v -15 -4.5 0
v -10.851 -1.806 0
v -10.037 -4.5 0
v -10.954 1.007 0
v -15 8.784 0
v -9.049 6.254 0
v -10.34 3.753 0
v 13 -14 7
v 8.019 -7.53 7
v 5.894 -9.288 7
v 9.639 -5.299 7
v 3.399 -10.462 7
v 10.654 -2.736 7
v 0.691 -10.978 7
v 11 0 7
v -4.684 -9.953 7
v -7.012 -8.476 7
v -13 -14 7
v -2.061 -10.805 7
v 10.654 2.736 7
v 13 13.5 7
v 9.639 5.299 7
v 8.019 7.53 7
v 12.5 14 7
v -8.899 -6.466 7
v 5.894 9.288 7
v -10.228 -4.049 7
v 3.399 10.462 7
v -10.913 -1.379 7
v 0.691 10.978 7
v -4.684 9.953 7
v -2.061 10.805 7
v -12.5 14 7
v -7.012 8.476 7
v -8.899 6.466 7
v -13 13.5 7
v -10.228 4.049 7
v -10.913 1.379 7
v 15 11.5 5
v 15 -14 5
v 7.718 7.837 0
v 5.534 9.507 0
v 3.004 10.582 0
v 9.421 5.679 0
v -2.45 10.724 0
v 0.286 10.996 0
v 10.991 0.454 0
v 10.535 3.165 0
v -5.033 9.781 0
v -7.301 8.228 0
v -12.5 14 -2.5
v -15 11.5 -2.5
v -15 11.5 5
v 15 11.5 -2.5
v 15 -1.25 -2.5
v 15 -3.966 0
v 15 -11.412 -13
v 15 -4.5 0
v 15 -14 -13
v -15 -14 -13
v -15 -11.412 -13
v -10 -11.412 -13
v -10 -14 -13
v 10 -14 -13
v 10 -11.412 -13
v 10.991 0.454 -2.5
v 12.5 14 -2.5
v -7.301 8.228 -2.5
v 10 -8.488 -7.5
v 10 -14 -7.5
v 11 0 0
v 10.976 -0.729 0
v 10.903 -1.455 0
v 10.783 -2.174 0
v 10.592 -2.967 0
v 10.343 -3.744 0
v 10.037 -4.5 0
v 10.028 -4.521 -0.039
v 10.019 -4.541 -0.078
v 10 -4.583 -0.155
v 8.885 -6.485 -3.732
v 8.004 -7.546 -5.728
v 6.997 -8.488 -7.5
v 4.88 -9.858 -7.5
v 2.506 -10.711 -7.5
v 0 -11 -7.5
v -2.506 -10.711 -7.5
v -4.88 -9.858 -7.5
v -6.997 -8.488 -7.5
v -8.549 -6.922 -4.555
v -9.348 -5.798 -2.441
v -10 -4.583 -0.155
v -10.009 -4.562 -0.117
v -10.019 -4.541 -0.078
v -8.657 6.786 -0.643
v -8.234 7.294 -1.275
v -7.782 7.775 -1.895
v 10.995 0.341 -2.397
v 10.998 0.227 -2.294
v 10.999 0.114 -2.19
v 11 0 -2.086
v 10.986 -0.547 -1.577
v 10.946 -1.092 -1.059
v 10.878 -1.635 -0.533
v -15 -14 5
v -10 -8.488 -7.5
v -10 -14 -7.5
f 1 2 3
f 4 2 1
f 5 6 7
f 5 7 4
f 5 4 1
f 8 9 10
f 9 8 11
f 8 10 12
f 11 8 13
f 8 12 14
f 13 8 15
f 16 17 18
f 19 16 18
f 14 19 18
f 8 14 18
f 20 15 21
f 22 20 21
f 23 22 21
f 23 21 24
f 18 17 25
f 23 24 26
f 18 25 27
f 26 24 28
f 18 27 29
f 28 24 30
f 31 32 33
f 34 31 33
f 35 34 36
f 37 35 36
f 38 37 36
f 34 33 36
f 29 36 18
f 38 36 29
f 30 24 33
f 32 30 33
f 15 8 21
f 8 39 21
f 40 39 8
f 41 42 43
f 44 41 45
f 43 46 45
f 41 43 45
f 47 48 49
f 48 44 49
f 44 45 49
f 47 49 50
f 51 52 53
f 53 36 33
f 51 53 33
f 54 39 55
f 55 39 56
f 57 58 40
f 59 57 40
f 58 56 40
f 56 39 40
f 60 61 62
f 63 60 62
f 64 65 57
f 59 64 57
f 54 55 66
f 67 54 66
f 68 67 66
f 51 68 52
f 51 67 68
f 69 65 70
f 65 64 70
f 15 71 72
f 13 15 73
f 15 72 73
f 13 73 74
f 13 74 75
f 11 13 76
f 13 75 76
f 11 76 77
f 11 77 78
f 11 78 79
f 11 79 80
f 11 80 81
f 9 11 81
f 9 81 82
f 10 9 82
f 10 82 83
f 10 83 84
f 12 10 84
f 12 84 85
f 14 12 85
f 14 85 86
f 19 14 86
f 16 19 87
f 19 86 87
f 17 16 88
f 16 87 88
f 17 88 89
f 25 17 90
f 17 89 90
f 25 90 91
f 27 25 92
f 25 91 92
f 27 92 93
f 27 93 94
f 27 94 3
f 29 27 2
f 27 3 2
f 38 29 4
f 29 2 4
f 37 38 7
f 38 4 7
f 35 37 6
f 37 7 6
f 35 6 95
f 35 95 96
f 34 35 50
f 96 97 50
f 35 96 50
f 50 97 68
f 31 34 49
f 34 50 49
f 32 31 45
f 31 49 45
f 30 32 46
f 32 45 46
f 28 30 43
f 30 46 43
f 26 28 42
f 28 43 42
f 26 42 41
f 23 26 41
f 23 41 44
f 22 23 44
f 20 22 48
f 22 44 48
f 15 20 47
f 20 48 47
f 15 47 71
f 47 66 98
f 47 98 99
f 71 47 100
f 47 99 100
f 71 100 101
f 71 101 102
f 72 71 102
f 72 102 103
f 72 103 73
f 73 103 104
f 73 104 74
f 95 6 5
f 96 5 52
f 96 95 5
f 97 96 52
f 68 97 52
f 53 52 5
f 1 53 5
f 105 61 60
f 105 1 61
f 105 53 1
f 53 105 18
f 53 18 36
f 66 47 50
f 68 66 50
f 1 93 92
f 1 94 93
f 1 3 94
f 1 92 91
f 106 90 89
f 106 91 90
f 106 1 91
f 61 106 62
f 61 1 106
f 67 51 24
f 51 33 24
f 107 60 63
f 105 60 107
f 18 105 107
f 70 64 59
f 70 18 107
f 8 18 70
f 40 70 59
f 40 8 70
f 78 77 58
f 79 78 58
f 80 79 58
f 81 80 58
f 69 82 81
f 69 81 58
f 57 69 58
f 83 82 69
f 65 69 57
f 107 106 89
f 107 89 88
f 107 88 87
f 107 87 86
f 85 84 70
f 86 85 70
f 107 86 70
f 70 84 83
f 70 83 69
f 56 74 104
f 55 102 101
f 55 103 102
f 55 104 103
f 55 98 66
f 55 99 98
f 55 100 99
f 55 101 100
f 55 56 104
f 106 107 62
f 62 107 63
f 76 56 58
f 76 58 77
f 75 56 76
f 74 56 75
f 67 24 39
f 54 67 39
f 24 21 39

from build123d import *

# Parameters (mm, degrees)
SKETCH1_R           = 11
BOSS_EXTRUDE1_DEPTH = 7
SKETCH2_W           = 5
SKETCH2_H           = 2.5
BOSS_EXTRUDE2_DEPTH = 13
CHAMFER2_SIZE       = 2
BOSS_EXTRUDE6_DEPTH = 2.5
CHAMFER3_SIZE       = 2
CHAMFER4_SIZE       = 2
BOSS_EXTRUDE4_DEPTH = 2.5
CHAMFER6_SIZE       = 2.5
CHAMFER7_SIZE       = 7
CHAMFER7_SIZE_2     = 13.165085257


with BuildPart() as part:
    # Sketch1 → Boss-Extrude1 (new body)
    with BuildSketch(Plane.XY):
        Polygon((-15, 11.5), (-12.5, 14), (12.5, 14), (15, 11.5), (15, -14), (-15, -14), align=None)
        Circle(SKETCH1_R, mode=Mode.SUBTRACT)
    extrude(amount=BOSS_EXTRUDE1_DEPTH)

    # Sketch2 → Boss-Extrude2 (add)
    with BuildSketch(Plane(origin=(0, 0, 0), x_dir=(-1, 0, 0), z_dir=(0, 0, -1))):
        with Locations((-12.5, -12.75)):
            Rectangle(SKETCH2_W, SKETCH2_H)
        with Locations((12.5, -12.75)):
            Rectangle(SKETCH2_W, SKETCH2_H)
    extrude(amount=BOSS_EXTRUDE2_DEPTH)

    # Chamfer2
    chamfer2_edges = [part.edges().sort_by_distance(p)[0] for p in [
        (-10, -12.75, 0),
        (10, -12.75, 0),
    ]]
    chamfer(chamfer2_edges, length=CHAMFER2_SIZE)

    # Sketch5 → Boss-Extrude6 (add)
    with BuildSketch(Plane.XZ.offset(14)):
        Polygon((-10, -2), (-10, -7.5), (10, -7.5), (10, -2), (8, 0), (-8, 0), align=None)
    extrude(amount=-BOSS_EXTRUDE6_DEPTH)

    # Chamfer3
    chamfer3_edges = [part.edges().sort_by_distance(p)[0] for p in [
        (15, -1.25, 7),
    ]]
    chamfer(chamfer3_edges, length=CHAMFER3_SIZE)

    # Chamfer4
    chamfer4_edges = [part.edges().sort_by_distance(p)[0] for p in [
        (-15, -1.25, 7),
    ]]
    chamfer(chamfer4_edges, length=CHAMFER4_SIZE)

    # Sketch4 → Boss-Extrude4 (add)
    with BuildSketch(Plane(origin=(0, 0, 0), x_dir=(-1, 0, 0), z_dir=(0, 0, -1))):
        Polygon((-15, -1.25), (15, 11.5), (12.5, 14), (-12.5, 14), (-15, 11.5), align=None)
    extrude(amount=BOSS_EXTRUDE4_DEPTH)

    # Chamfer6
    # the kernel refuses this chamfer: 2.5 mm, written as the material it adds along each edge
    with BuildSketch(Plane(origin=(20.916998416, -3.764724327, 0), x_dir=(-0.39099275668343275, -0.9199829569021947, 0.02749587661058635), z_dir=(-0.9203309184584746, 0.39114064034485174, 0))) as chamfer6_piece_1_section:
        Polygon((CHAMFER6_SIZE * 0.999621916911, -CHAMFER6_SIZE * 0.0274958766106), (-CHAMFER6_SIZE * 0.0274958766106, -CHAMFER6_SIZE * 0.999621916911), (0, 0), align=None)
    chamfer6_piece_1 = extrude(amount=17.214861222, mode=Mode.PRIVATE)
    chamfer6_piece_1 = chamfer6_piece_1 - Plane(origin=(0, 0, -0.830769879), x_dir=(1, 0, 0), z_dir=(0, 0, -1)) * Cylinder(11, 45, mode=Mode.PRIVATE)
    chamfer6_piece_1 = split(chamfer6_piece_1, bisect_by=Plane(origin=(15, -1.305255327, -0.830769879), z_dir=(-1, 0, 0)), keep=Keep.TOP, mode=Mode.PRIVATE)
    add(chamfer6_piece_1)
    with BuildSketch(Plane(origin=(-1.383846422, 5.71313473, 0), x_dir=(-0.39099275668343275, -0.9199829569021946, 0.02749587661058637), z_dir=(-0.9203309184584746, 0.39114064034485174, 0))) as chamfer6_piece_2_section:
        Polygon((CHAMFER6_SIZE * 0.999621916911, -CHAMFER6_SIZE * 0.0274958766106), (-CHAMFER6_SIZE * 0.0274958766106, -CHAMFER6_SIZE * 0.999621916911), (0, 0), align=None)
    chamfer6_piece_2 = extrude(amount=21.224052785, mode=Mode.PRIVATE)
    chamfer6_piece_2 = chamfer6_piece_2 - Plane(origin=(0, 0, -0.851096237), x_dir=(1, 0, 0), z_dir=(0, 0, -1)) * Cylinder(11, 53, mode=Mode.PRIVATE)
    chamfer6_piece_2 = split(chamfer6_piece_2, bisect_by=Plane(origin=(-15, 9.126408424, -0.851096237), z_dir=(1, 0, 0)), keep=Keep.TOP, mode=Mode.PRIVATE)
    add(chamfer6_piece_2)

    # Chamfer7
    # the kernel refuses this chamfer: 13.165085257, 7 mm, written as the material it adds along each edge
    with BuildSketch(Plane(origin=(-15, -11.5, 0), x_dir=(0, 0.9979482451756082, 0.06402577567608186), z_dir=(1, 0, 0))) as chamfer7_piece_1_section:
        Polygon((CHAMFER7_SIZE * 0.997948245176, -CHAMFER7_SIZE * 0.0640257756761), (-CHAMFER7_SIZE_2 * 0.0640257756781, -CHAMFER7_SIZE_2 * 0.997948245208), (0, 0), align=None)
    chamfer7_piece_1 = extrude(amount=30, mode=Mode.PRIVATE)
    chamfer7_piece_1 = chamfer7_piece_1 - Plane(origin=(0, 0, -3.073682767), x_dir=(1, 0, 0), z_dir=(0, 0, -1)) * Cylinder(11, 113, mode=Mode.PRIVATE)
    chamfer7_piece_1 = split(chamfer7_piece_1, bisect_by=Plane(origin=(-12.500128058, -8.887755394, -7.5), z_dir=(0, 0, 1)), keep=Keep.TOP, mode=Mode.PRIVATE)
    chamfer7_piece_1 = split(chamfer7_piece_1, bisect_by=Plane(origin=(-10, -8.887755394, -3.073682767), z_dir=(-1, 0, 0)), keep=Keep.TOP, mode=Mode.PRIVATE)
    add(chamfer7_piece_1)
    with BuildSketch(Plane(origin=(-15, -11.5, 0), x_dir=(0, 0.9979482451756082, 0.06402577567608186), z_dir=(1, 0, 0))) as chamfer7_piece_2_section:
        Polygon((CHAMFER7_SIZE * 0.997948245176, -CHAMFER7_SIZE * 0.0640257756761), (-CHAMFER7_SIZE_2 * 0.0640257756781, -CHAMFER7_SIZE_2 * 0.997948245208), (0, 0), align=None)
    chamfer7_piece_2 = extrude(amount=30, mode=Mode.PRIVATE)
    chamfer7_piece_2 = split(chamfer7_piece_2, bisect_by=Plane(origin=(-12.5, -10.721530873, -7.5), z_dir=(0, 0, -1)), keep=Keep.TOP, mode=Mode.PRIVATE)
    chamfer7_piece_2 = split(chamfer7_piece_2, bisect_by=Plane(origin=(-10, -10.721530873, -9.597564575), z_dir=(-1, 0, 0)), keep=Keep.TOP, mode=Mode.PRIVATE)
    chamfer7_piece_2 = split(chamfer7_piece_2, bisect_by=Plane(origin=(-12.5, -10.721530873, -13), z_dir=(0, 0, 1)), keep=Keep.TOP, mode=Mode.PRIVATE)
    add(chamfer7_piece_2)
    with BuildSketch(Plane(origin=(-15, -11.5, 0), x_dir=(0, 0.9979482451756082, 0.06402577567608186), z_dir=(1, 0, 0))) as chamfer7_piece_3_section:
        Polygon((CHAMFER7_SIZE * 0.997948245176, -CHAMFER7_SIZE * 0.0640257756761), (-CHAMFER7_SIZE_2 * 0.0640257756781, -CHAMFER7_SIZE_2 * 0.997948245208), (0, 0), align=None)
    chamfer7_piece_3 = extrude(amount=30, mode=Mode.PRIVATE)
    chamfer7_piece_3 = chamfer7_piece_3 - Plane(origin=(0, 0, -3.793876077), x_dir=(1, 0, 0), z_dir=(0, 0, -1)) * Cylinder(11, 113, mode=Mode.PRIVATE)
    chamfer7_piece_3 = split(chamfer7_piece_3, bisect_by=Plane(origin=(-9.499486782, -6.598719884, -7.5), z_dir=(0, 0, 1)), keep=Keep.TOP, mode=Mode.PRIVATE)
    chamfer7_piece_3 = split(chamfer7_piece_3, bisect_by=Plane(origin=(10, -6.598719884, -3.793876077), z_dir=(-1, 0, 0)), keep=Keep.TOP, mode=Mode.PRIVATE)
    chamfer7_piece_3 = split(chamfer7_piece_3, bisect_by=Plane(origin=(-10, -6.598719884, -3.793876077), z_dir=(1, 0, 0)), keep=Keep.TOP, mode=Mode.PRIVATE)
    add(chamfer7_piece_3)
    with BuildSketch(Plane(origin=(-15, -11.5, 0), x_dir=(0, 0.9979482451756082, 0.06402577567608186), z_dir=(1, 0, 0))) as chamfer7_piece_4_section:
        Polygon((CHAMFER7_SIZE * 0.997948245176, -CHAMFER7_SIZE * 0.0640257756761), (-CHAMFER7_SIZE_2 * 0.0640257756781, -CHAMFER7_SIZE_2 * 0.997948245208), (0, 0), align=None)
    chamfer7_piece_4 = extrude(amount=30, mode=Mode.PRIVATE)
    chamfer7_piece_4 = split(chamfer7_piece_4, bisect_by=Plane(origin=(12.5, -10.721530873, -7.5), z_dir=(0, 0, -1)), keep=Keep.TOP, mode=Mode.PRIVATE)
    chamfer7_piece_4 = split(chamfer7_piece_4, bisect_by=Plane(origin=(10, -10.721530873, -9.597564575), z_dir=(1, 0, 0)), keep=Keep.TOP, mode=Mode.PRIVATE)
    chamfer7_piece_4 = split(chamfer7_piece_4, bisect_by=Plane(origin=(12.5, -10.721530873, -13), z_dir=(0, 0, 1)), keep=Keep.TOP, mode=Mode.PRIVATE)
    add(chamfer7_piece_4)
    with BuildSketch(Plane(origin=(-15, -11.5, 0), x_dir=(0, 0.9979482451756082, 0.06402577567608186), z_dir=(1, 0, 0))) as chamfer7_piece_5_section:
        Polygon((CHAMFER7_SIZE * 0.997948245176, -CHAMFER7_SIZE * 0.0640257756761), (-CHAMFER7_SIZE_2 * 0.0640257756781, -CHAMFER7_SIZE_2 * 0.997948245208), (0, 0), align=None)
    chamfer7_piece_5 = extrude(amount=30, mode=Mode.PRIVATE)
    chamfer7_piece_5 = chamfer7_piece_5 - Plane(origin=(0, 0, -3.073682766), x_dir=(1, 0, 0), z_dir=(0, 0, -1)) * Cylinder(11, 113, mode=Mode.PRIVATE)
    chamfer7_piece_5 = split(chamfer7_piece_5, bisect_by=Plane(origin=(12.500128057, -8.887755394, -7.5), z_dir=(0, 0, 1)), keep=Keep.TOP, mode=Mode.PRIVATE)
    chamfer7_piece_5 = split(chamfer7_piece_5, bisect_by=Plane(origin=(10, -8.887755394, -3.073682766), z_dir=(1, 0, 0)), keep=Keep.TOP, mode=Mode.PRIVATE)
    add(chamfer7_piece_5)


solid = part.part
